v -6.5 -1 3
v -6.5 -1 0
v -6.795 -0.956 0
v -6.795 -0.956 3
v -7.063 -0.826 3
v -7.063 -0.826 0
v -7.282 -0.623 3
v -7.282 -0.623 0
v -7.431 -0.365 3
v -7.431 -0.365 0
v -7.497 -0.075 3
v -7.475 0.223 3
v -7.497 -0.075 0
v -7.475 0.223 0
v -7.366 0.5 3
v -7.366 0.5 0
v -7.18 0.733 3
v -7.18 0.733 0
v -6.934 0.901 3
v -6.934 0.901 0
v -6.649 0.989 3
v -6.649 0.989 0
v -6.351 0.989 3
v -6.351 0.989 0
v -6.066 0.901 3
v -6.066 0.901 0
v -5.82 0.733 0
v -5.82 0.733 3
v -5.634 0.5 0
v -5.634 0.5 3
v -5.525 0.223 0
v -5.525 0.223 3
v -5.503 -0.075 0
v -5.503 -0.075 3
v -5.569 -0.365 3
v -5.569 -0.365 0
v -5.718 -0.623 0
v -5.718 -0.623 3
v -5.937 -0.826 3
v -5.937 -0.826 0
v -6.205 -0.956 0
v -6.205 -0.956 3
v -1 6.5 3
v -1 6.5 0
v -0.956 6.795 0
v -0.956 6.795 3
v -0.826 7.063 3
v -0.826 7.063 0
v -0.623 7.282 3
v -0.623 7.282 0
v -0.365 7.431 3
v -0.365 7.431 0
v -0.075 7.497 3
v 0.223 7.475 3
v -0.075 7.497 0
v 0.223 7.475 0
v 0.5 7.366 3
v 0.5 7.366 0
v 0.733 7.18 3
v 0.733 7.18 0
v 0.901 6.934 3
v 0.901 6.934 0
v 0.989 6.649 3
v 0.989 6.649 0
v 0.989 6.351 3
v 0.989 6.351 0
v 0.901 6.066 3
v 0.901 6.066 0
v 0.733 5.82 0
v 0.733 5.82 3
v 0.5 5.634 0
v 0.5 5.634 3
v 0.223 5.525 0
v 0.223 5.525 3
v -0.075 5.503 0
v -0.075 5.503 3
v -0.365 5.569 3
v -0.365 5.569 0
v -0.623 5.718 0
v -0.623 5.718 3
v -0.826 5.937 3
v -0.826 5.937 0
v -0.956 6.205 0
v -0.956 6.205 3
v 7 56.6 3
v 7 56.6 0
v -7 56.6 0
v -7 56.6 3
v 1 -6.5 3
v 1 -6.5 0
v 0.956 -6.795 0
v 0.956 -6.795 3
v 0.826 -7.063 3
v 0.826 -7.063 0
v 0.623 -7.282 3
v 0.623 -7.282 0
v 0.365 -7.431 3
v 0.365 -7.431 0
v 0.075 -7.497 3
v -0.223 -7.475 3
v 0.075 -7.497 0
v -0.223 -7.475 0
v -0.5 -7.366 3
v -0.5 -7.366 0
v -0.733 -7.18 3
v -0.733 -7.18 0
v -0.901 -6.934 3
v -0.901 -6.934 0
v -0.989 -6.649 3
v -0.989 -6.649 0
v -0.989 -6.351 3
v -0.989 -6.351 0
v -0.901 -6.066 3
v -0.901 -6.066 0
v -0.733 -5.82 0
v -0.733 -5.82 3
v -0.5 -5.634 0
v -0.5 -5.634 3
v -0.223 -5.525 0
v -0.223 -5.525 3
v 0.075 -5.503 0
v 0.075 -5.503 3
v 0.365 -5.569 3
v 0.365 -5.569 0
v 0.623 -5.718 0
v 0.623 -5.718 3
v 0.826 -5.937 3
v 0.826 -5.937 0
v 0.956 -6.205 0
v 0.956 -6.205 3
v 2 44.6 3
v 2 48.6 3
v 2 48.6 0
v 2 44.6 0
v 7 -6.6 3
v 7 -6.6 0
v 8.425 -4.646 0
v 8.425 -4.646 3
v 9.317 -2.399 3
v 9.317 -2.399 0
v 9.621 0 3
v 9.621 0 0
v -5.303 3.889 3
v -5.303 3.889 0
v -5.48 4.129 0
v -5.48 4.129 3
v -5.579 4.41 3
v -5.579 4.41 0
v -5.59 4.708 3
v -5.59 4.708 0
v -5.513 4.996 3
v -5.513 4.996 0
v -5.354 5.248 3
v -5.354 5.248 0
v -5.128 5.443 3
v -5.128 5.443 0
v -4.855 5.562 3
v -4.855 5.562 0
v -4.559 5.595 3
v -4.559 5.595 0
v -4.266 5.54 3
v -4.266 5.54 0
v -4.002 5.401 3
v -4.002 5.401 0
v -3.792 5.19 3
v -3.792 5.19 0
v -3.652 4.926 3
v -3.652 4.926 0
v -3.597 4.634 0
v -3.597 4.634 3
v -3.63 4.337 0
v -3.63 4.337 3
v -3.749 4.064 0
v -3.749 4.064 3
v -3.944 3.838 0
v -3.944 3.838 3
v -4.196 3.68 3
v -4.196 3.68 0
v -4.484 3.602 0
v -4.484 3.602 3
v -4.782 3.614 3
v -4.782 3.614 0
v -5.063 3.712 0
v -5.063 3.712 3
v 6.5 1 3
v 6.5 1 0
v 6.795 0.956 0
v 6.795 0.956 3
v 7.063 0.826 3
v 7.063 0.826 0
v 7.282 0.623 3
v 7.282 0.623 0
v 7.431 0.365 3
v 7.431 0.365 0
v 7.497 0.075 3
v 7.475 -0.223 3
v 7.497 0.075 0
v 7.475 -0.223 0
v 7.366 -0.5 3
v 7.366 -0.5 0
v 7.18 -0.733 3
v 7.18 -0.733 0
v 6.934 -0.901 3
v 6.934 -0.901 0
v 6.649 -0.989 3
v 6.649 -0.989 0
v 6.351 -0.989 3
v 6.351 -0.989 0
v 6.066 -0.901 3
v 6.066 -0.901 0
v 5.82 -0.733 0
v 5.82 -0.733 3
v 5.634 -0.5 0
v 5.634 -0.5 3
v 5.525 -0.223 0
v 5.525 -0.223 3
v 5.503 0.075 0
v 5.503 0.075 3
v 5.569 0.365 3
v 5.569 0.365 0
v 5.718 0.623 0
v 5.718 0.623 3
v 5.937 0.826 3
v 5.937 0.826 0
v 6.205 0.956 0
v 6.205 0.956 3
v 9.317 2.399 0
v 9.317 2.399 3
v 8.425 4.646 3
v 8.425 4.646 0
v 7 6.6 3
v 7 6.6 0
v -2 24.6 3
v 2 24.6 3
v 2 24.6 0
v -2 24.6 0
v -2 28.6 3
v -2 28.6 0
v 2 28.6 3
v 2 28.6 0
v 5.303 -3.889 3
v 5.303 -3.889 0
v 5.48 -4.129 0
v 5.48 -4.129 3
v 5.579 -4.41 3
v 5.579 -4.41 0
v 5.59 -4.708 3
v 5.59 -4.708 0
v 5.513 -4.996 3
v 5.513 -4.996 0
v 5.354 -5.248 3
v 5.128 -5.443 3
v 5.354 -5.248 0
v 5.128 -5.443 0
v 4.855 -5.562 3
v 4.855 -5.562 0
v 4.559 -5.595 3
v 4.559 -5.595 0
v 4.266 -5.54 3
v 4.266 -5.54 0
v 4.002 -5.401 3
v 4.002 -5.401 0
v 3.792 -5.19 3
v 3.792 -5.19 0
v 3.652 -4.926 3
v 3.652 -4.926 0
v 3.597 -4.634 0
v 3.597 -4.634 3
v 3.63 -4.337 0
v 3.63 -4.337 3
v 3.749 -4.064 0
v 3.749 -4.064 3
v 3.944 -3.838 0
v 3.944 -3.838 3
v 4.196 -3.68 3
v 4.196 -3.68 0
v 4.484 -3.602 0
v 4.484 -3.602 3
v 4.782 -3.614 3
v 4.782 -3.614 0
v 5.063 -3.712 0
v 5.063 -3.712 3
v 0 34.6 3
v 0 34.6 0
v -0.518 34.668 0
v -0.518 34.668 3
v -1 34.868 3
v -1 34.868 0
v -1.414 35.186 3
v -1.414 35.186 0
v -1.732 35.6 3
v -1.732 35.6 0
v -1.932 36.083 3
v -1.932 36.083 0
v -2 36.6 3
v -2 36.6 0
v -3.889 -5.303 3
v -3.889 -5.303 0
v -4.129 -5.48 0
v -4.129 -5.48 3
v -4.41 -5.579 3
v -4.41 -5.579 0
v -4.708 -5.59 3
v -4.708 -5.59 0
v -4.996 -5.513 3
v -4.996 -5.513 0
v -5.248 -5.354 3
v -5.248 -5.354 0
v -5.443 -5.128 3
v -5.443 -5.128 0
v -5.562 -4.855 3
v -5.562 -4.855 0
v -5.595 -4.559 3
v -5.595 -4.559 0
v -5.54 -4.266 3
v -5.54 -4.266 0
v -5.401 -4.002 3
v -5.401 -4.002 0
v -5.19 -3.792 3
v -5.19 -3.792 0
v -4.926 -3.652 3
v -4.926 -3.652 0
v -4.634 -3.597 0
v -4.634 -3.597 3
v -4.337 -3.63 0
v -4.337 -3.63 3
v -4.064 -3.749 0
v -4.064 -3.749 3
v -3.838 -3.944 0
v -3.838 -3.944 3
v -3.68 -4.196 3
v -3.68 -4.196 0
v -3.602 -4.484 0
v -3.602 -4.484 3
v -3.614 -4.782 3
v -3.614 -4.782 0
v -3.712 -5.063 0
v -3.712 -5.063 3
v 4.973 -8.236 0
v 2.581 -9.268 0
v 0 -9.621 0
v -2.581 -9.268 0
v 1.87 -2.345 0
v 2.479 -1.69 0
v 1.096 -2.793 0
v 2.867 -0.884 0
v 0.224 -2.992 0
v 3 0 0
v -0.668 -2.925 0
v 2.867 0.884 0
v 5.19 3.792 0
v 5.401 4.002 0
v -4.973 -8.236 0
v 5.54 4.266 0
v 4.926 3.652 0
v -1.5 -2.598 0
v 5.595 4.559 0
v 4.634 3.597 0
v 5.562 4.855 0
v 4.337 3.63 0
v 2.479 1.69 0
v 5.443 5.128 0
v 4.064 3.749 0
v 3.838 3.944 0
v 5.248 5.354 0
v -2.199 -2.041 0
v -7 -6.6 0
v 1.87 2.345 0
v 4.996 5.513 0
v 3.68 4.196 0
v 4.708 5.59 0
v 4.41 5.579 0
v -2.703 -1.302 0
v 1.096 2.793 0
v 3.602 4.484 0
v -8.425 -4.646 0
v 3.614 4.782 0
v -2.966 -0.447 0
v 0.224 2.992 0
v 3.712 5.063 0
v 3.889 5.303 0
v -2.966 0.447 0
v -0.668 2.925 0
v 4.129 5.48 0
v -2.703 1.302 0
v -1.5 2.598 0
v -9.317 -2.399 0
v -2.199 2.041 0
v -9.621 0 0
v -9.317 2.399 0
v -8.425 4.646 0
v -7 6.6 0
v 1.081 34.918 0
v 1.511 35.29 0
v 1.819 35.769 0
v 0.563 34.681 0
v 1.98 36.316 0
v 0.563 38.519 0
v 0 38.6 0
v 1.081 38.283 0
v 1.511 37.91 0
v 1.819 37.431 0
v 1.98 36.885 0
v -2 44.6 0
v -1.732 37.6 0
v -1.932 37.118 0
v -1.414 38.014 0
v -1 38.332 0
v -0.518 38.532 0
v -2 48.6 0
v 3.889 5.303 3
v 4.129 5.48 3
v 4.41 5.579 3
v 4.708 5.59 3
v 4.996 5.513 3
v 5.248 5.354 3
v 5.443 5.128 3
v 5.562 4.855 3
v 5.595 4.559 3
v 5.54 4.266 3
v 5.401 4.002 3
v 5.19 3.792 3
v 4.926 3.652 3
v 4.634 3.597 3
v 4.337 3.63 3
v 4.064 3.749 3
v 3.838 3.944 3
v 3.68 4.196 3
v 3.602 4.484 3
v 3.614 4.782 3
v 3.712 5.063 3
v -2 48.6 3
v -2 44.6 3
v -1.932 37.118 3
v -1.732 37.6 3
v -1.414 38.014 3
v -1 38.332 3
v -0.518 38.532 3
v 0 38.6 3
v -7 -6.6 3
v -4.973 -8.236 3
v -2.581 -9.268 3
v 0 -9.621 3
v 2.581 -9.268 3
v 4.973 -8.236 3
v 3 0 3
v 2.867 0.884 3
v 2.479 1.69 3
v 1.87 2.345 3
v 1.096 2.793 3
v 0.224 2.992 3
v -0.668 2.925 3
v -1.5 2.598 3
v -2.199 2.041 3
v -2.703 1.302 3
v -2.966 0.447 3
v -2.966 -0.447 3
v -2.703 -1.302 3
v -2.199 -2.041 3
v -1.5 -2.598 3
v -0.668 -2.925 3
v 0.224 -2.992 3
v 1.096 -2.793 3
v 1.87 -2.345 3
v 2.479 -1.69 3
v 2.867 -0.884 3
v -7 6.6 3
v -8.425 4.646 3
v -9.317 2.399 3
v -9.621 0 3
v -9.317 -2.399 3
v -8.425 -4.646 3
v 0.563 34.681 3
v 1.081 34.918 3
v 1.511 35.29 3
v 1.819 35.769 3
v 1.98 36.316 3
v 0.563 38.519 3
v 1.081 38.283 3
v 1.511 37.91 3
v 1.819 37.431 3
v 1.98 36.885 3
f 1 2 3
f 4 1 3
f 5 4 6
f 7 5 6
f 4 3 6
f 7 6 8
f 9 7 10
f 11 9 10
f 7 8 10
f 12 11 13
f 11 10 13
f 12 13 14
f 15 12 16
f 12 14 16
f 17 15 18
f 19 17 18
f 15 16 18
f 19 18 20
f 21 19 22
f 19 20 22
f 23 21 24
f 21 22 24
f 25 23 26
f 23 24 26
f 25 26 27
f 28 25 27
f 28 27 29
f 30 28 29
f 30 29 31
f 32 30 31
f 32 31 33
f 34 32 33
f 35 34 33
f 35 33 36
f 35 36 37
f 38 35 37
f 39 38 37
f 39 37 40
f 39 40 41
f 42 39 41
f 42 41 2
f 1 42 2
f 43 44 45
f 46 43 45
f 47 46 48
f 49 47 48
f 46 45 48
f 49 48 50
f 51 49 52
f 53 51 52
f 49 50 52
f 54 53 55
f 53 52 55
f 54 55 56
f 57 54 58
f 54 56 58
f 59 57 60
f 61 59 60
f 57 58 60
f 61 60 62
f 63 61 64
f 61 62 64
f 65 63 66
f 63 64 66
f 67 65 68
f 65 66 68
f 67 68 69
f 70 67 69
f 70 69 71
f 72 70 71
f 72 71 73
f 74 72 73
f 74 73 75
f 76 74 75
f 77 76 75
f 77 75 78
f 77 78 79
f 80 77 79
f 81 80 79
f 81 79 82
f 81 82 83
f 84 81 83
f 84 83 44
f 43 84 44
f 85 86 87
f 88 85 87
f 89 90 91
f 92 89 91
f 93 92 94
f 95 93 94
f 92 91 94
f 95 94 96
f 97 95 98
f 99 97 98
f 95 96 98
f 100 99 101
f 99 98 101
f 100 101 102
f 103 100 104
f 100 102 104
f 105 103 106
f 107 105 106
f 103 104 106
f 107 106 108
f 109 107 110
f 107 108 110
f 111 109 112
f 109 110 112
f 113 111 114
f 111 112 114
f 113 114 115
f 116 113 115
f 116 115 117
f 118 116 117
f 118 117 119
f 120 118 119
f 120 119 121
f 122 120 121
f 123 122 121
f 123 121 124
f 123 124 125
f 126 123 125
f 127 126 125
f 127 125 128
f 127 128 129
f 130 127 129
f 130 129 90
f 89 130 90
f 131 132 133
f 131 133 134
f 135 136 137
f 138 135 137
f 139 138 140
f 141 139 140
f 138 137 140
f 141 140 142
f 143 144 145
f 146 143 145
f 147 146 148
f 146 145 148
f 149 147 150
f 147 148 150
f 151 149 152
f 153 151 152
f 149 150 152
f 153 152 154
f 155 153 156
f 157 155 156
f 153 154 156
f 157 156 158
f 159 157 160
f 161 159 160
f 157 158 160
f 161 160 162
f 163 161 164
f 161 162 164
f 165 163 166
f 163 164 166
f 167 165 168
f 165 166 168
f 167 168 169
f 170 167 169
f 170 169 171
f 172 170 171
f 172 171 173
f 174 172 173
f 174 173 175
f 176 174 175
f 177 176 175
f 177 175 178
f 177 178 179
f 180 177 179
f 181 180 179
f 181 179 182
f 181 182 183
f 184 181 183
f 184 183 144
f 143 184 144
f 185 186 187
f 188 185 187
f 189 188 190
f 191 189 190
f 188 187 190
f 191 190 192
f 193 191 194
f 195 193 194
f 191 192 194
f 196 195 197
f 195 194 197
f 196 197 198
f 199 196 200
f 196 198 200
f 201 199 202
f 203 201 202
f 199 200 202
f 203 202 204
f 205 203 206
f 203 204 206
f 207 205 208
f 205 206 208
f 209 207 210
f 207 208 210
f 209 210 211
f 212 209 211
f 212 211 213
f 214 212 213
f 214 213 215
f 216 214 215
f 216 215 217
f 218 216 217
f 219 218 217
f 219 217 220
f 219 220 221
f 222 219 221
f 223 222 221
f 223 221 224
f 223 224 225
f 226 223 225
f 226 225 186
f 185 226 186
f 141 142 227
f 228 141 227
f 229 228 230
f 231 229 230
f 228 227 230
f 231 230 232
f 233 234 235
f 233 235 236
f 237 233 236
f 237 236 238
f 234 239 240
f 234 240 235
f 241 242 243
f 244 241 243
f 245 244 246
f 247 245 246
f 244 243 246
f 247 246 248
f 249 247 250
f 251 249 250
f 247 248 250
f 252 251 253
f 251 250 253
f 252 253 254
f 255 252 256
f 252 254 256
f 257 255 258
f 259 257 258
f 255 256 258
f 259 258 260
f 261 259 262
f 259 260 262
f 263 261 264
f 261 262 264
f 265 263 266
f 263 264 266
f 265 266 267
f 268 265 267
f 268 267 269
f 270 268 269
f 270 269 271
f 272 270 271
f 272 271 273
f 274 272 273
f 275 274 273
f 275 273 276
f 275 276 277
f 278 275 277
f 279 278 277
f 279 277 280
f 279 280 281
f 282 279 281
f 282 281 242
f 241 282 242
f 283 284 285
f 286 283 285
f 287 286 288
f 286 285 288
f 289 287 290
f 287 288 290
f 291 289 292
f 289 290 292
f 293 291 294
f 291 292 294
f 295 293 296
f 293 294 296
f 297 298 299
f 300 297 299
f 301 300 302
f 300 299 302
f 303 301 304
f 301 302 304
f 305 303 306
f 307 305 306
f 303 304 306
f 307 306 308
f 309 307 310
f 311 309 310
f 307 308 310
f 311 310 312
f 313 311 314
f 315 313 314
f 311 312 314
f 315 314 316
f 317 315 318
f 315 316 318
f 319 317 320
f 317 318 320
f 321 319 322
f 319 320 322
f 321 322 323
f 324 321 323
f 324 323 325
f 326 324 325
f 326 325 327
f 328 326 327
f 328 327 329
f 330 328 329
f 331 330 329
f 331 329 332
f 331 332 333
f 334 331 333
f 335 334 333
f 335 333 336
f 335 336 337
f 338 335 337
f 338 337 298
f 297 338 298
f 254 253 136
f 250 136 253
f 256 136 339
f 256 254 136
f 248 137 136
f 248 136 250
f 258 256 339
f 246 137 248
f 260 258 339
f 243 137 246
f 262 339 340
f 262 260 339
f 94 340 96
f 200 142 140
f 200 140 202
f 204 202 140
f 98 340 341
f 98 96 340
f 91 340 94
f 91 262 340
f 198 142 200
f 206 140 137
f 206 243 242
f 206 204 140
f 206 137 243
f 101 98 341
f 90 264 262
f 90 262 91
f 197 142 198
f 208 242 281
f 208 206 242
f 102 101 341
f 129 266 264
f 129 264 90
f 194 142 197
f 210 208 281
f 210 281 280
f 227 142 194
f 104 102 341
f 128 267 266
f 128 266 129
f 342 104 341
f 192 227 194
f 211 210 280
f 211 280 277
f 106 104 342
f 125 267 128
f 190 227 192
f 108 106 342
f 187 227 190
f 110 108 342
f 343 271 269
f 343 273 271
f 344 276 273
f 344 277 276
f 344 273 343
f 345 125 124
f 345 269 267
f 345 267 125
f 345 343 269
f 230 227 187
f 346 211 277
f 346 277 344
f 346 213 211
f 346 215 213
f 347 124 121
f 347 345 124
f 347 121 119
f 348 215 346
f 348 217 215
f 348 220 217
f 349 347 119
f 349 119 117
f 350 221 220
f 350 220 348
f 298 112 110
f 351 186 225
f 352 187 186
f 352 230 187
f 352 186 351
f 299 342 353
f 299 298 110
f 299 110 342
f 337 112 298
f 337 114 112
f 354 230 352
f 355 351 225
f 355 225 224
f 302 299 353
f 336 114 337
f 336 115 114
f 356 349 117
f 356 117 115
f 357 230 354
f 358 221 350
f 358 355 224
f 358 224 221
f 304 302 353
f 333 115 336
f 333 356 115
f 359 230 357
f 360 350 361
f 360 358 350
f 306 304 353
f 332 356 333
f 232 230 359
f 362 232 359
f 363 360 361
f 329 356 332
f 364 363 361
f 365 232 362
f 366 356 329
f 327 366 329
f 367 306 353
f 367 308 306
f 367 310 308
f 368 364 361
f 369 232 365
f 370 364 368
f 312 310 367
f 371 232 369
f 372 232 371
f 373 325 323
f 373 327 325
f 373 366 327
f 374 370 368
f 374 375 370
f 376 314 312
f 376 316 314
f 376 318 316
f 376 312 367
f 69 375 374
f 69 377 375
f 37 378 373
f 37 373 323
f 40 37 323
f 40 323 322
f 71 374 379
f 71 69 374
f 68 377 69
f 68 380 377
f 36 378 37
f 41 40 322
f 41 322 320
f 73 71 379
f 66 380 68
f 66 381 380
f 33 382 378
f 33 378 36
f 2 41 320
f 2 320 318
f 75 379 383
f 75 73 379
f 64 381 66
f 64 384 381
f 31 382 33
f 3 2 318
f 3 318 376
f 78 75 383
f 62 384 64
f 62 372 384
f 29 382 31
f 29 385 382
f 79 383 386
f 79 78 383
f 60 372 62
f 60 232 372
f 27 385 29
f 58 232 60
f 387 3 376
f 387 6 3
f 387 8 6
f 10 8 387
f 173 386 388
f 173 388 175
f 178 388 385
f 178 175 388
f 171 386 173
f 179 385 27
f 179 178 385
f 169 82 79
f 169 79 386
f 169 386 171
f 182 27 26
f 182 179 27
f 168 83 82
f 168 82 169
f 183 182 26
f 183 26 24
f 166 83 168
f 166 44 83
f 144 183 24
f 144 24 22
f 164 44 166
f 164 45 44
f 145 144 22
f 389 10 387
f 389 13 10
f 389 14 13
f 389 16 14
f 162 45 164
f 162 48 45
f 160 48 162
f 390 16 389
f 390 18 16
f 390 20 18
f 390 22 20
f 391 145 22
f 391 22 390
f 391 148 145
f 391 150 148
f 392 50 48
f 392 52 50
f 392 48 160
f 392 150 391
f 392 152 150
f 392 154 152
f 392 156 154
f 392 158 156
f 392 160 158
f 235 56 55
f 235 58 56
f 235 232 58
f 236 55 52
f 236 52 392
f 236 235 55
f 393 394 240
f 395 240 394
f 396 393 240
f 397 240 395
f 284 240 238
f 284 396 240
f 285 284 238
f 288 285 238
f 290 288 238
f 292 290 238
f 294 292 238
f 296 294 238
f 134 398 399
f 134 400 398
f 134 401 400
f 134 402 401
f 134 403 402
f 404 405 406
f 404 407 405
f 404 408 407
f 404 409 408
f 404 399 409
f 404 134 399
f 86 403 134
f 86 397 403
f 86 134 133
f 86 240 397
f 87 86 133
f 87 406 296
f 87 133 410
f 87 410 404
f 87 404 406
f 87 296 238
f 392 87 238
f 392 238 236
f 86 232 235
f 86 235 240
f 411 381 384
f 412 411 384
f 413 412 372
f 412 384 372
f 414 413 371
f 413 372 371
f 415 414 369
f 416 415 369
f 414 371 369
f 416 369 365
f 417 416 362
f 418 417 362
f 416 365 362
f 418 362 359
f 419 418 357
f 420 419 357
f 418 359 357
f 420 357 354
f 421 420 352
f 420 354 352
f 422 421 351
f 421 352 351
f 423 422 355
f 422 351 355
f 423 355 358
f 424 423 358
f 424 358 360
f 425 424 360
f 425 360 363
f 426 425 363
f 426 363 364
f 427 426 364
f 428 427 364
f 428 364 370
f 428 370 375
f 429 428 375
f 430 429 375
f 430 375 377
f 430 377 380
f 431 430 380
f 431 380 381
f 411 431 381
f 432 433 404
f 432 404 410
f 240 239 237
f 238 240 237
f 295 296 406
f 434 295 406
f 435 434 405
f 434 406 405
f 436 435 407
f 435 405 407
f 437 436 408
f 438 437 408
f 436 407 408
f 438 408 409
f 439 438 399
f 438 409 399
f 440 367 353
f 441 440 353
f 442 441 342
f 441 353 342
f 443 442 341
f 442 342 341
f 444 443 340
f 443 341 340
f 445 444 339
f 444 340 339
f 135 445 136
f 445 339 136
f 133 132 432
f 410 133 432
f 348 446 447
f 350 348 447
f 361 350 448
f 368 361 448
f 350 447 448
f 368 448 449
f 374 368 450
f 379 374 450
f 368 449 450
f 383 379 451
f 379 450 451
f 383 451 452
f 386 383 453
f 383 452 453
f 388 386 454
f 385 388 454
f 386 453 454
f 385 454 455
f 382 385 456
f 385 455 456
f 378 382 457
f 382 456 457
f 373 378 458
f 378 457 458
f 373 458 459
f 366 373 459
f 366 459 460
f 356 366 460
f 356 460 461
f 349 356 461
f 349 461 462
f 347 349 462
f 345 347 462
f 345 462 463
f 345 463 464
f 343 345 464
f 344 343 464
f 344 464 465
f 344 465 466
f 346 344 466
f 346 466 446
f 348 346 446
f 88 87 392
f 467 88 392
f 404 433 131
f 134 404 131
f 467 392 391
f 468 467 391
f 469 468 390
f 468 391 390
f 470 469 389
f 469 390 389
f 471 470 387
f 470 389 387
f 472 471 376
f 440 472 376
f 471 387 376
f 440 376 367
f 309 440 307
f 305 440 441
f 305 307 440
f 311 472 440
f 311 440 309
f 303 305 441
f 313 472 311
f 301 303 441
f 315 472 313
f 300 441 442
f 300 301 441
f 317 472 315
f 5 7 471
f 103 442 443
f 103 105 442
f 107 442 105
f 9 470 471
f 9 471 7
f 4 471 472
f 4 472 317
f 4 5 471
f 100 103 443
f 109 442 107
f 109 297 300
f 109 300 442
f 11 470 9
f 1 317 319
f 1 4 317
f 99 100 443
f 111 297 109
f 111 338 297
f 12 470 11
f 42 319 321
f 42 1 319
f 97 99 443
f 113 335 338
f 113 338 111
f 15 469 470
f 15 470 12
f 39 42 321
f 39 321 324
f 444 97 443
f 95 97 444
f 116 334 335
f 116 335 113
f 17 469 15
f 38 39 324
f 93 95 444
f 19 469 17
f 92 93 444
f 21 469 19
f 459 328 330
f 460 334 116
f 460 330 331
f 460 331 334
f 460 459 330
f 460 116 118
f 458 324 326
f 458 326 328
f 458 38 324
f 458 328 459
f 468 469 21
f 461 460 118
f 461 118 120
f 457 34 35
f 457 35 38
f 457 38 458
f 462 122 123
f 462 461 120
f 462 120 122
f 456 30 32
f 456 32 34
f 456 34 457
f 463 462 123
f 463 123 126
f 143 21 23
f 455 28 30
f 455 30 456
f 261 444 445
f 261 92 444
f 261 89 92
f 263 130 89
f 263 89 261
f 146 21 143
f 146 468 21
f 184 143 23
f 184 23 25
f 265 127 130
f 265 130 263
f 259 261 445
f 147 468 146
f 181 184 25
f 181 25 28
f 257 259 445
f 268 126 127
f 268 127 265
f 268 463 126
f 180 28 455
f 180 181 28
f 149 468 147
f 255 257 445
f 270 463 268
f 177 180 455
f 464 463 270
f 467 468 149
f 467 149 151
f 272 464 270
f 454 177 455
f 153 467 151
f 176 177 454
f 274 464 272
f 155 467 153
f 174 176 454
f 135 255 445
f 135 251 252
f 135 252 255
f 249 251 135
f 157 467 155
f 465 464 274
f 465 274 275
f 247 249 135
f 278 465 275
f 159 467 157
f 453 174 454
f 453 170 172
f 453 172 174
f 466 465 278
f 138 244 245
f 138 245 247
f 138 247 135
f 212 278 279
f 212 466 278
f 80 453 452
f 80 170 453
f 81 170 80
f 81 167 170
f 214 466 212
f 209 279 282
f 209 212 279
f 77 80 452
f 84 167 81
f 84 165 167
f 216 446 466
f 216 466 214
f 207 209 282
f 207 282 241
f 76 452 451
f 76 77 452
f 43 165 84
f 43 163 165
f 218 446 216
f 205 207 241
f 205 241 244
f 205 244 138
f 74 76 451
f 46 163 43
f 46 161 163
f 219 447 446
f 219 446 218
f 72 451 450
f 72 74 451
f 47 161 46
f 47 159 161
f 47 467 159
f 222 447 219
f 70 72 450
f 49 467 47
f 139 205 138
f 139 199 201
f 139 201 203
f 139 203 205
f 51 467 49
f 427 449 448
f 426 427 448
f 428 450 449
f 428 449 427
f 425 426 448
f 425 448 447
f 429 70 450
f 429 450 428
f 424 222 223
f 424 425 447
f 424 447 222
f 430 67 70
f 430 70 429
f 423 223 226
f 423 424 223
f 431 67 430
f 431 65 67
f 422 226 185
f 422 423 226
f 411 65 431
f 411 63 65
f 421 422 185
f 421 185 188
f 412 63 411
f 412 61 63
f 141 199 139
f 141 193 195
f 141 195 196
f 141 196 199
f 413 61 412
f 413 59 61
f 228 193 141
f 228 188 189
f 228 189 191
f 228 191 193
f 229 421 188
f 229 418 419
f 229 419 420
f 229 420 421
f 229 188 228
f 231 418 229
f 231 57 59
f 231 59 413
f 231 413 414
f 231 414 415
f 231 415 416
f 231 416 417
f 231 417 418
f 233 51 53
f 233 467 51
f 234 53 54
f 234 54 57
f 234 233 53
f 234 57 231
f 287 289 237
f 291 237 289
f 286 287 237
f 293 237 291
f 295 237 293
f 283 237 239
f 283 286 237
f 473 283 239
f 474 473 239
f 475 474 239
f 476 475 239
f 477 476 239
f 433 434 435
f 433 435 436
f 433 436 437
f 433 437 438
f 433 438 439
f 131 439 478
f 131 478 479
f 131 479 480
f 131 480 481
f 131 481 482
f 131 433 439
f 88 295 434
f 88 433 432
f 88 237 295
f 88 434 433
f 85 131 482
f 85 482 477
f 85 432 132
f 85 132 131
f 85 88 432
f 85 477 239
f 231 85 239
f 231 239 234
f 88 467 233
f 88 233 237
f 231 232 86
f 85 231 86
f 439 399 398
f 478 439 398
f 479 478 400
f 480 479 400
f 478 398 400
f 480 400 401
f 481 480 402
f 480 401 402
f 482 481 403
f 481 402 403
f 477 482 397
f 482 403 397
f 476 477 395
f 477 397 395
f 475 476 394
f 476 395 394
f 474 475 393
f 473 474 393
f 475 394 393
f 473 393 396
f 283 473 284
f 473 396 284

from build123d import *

# Parameters (mm, degrees)
SKETCH_1_W               = 14
SKETCH_1_H               = 13.200286042
EXTRUDE_1_DEPTH          = 3
SKETCH_3_OUTSIDE_W       = 35.048
SKETCH_3_OUTSIDE_H       = 82.027
CUT_EXTRUDE_2_DEPTH      = 3
SKETCH_4_R               = 3
CUT_EXTRUDE_3_DEPTH      = 10
SKETCH_5_R               = 1
CUT_EXTRUDE_4_DEPTH      = 10
SKETCH_6_W               = 4
SKETCH_6_H               = 4
EXTRUDE_3_DEPTH          = 3
CUT_EXTRUDE_5_DEPTH      = 10
PATTERN_CIRCULAR_1_COUNT = 8


with BuildPart() as part:
    # 草图1 → 凸台-拉伸1 (new body)
    with BuildSketch(Plane.XY):
        Rectangle(SKETCH_1_W, SKETCH_1_H)
        with BuildLine():
            ThreePointArc((-7, 6.600143021), (-9.620908892, 0), (-7, -6.600143021))
            Line((-7, -6.600143021), (-7, 6.600143021))
        make_face()
        with BuildLine():
            Line((7, -6.600143021), (-7, -6.600143021))
            ThreePointArc((-7, -6.600143021), (0, -9.620908892), (7, -6.600143021))
        make_face()
        with BuildLine():
            Line((7, 6.600143021), (7, -6.600143021))
            ThreePointArc((7, -6.600143021), (8.941707056, -3.550741166), (9.620908892, 0))
            ThreePointArc((9.620908892, 0), (8.941707056, 3.550741166), (7, 6.600143021))
        make_face()
        with BuildLine():
            ThreePointArc((7, 6.600143021), (0, 9.620908892), (-7, 6.600143021))
            Line((-7, 6.600143021), (7, 6.600143021))
        make_face()
        with BuildLine():
            Line((-7, 56.600143021), (-7, 6.600143021))
            ThreePointArc((-7, 6.600143021), (0, 9.620908892), (7, 6.600143021))
            Line((7, 6.600143021), (7, 56.600143021))
            Line((7, 56.600143021), (-7, 56.600143021))
        make_face()
    extrude(amount=EXTRUDE_1_DEPTH)

    # 草图3 outside → 切除-拉伸2 (cut)
    with BuildSketch(Plane.XY.offset(3)):
        with Locations((0, 23.4895)):
            Rectangle(SKETCH_3_OUTSIDE_W, SKETCH_3_OUTSIDE_H)
        with BuildLine():
            Line((7, 56.600143021), (0, 56.600143021))
            Line((0, 56.600143021), (-7, 56.600143021))
            Line((-7, 56.600143021), (-7, 6.600143021))
            ThreePointArc((-7, 6.600143021), (0, -9.620908892), (7, 6.600143021))
            Line((7, 6.600143021), (7, 56.600143021))
        make_face(mode=Mode.SUBTRACT)
        Polygon((-2, 28.600143021), (0, 28.600143021), (2, 28.600143021), (2, 24.600143021), (-2, 24.600143021), align=None)
        Polygon((-2, 38.600143021), (0, 38.600143021), (2, 38.600143021), (2, 34.600143021), (0, 34.600143021), (-2, 34.600143021), align=None)
        Polygon((-2, 48.600143021), (0, 48.600143021), (2, 48.600143021), (2, 44.600143021), (0, 44.600143021), (-2, 44.600143021), align=None)
    extrude(amount=-CUT_EXTRUDE_2_DEPTH, mode=Mode.SUBTRACT)

    # 草图4 → 切除-拉伸3 (cut)
    with BuildSketch(Plane.XY.offset(3)):
        Circle(SKETCH_4_R)
    extrude(amount=-CUT_EXTRUDE_3_DEPTH, mode=Mode.SUBTRACT)

    # 草图5 → 切除-拉伸4 (cut)
    with BuildSketch(Plane(origin=(0, 0, 0), x_dir=(-1, 0, 0), z_dir=(0, 0, -1))):
        with Locations((0, 6.5)):
            Circle(SKETCH_5_R)
    cut_extrude_4 = extrude(amount=-CUT_EXTRUDE_4_DEPTH, mode=Mode.SUBTRACT)

    # 草图6 → 凸台-拉伸3 (add)
    with BuildSketch(Plane(origin=(0, 0, 0), x_dir=(-1, 0, 0), z_dir=(0, 0, -1))):
        with Locations((0, 36.600143021)):
            Rectangle(SKETCH_6_W, SKETCH_6_H)
    extrude(amount=-EXTRUDE_3_DEPTH)

    # 草图7 → 切除-拉伸5 (cut)
    with BuildSketch(Plane(origin=(0, 0, 0), x_dir=(-1, 0, 0), z_dir=(0, 0, -1))):
        with BuildLine():
            ThreePointArc((0, 38.600143021), (-2, 36.600143021), (0, 34.600143021))
            Line((0, 34.600143021), (0, 38.600143021))
        make_face()
        with BuildLine():
            Line((0, 38.600143021), (0, 34.600143021))
            ThreePointArc((0, 34.600143021), (1.414213562, 35.185929459), (2, 36.600143021))
            ThreePointArc((2, 36.600143021), (1.414213562, 38.014356584), (0, 38.600143021))
        make_face()
    extrude(amount=-CUT_EXTRUDE_5_DEPTH, mode=Mode.SUBTRACT)

    # 阵列(圆周)1: 切除-拉伸4 ×8 about axis
    pattern_circular_1_axis = Axis((0, 0, 0), (0, 0, 1))
    for i in range(1, PATTERN_CIRCULAR_1_COUNT):
        add(cut_extrude_4.rotate(pattern_circular_1_axis, i * 360 / PATTERN_CIRCULAR_1_COUNT), mode=Mode.SUBTRACT)


solid = part.part
